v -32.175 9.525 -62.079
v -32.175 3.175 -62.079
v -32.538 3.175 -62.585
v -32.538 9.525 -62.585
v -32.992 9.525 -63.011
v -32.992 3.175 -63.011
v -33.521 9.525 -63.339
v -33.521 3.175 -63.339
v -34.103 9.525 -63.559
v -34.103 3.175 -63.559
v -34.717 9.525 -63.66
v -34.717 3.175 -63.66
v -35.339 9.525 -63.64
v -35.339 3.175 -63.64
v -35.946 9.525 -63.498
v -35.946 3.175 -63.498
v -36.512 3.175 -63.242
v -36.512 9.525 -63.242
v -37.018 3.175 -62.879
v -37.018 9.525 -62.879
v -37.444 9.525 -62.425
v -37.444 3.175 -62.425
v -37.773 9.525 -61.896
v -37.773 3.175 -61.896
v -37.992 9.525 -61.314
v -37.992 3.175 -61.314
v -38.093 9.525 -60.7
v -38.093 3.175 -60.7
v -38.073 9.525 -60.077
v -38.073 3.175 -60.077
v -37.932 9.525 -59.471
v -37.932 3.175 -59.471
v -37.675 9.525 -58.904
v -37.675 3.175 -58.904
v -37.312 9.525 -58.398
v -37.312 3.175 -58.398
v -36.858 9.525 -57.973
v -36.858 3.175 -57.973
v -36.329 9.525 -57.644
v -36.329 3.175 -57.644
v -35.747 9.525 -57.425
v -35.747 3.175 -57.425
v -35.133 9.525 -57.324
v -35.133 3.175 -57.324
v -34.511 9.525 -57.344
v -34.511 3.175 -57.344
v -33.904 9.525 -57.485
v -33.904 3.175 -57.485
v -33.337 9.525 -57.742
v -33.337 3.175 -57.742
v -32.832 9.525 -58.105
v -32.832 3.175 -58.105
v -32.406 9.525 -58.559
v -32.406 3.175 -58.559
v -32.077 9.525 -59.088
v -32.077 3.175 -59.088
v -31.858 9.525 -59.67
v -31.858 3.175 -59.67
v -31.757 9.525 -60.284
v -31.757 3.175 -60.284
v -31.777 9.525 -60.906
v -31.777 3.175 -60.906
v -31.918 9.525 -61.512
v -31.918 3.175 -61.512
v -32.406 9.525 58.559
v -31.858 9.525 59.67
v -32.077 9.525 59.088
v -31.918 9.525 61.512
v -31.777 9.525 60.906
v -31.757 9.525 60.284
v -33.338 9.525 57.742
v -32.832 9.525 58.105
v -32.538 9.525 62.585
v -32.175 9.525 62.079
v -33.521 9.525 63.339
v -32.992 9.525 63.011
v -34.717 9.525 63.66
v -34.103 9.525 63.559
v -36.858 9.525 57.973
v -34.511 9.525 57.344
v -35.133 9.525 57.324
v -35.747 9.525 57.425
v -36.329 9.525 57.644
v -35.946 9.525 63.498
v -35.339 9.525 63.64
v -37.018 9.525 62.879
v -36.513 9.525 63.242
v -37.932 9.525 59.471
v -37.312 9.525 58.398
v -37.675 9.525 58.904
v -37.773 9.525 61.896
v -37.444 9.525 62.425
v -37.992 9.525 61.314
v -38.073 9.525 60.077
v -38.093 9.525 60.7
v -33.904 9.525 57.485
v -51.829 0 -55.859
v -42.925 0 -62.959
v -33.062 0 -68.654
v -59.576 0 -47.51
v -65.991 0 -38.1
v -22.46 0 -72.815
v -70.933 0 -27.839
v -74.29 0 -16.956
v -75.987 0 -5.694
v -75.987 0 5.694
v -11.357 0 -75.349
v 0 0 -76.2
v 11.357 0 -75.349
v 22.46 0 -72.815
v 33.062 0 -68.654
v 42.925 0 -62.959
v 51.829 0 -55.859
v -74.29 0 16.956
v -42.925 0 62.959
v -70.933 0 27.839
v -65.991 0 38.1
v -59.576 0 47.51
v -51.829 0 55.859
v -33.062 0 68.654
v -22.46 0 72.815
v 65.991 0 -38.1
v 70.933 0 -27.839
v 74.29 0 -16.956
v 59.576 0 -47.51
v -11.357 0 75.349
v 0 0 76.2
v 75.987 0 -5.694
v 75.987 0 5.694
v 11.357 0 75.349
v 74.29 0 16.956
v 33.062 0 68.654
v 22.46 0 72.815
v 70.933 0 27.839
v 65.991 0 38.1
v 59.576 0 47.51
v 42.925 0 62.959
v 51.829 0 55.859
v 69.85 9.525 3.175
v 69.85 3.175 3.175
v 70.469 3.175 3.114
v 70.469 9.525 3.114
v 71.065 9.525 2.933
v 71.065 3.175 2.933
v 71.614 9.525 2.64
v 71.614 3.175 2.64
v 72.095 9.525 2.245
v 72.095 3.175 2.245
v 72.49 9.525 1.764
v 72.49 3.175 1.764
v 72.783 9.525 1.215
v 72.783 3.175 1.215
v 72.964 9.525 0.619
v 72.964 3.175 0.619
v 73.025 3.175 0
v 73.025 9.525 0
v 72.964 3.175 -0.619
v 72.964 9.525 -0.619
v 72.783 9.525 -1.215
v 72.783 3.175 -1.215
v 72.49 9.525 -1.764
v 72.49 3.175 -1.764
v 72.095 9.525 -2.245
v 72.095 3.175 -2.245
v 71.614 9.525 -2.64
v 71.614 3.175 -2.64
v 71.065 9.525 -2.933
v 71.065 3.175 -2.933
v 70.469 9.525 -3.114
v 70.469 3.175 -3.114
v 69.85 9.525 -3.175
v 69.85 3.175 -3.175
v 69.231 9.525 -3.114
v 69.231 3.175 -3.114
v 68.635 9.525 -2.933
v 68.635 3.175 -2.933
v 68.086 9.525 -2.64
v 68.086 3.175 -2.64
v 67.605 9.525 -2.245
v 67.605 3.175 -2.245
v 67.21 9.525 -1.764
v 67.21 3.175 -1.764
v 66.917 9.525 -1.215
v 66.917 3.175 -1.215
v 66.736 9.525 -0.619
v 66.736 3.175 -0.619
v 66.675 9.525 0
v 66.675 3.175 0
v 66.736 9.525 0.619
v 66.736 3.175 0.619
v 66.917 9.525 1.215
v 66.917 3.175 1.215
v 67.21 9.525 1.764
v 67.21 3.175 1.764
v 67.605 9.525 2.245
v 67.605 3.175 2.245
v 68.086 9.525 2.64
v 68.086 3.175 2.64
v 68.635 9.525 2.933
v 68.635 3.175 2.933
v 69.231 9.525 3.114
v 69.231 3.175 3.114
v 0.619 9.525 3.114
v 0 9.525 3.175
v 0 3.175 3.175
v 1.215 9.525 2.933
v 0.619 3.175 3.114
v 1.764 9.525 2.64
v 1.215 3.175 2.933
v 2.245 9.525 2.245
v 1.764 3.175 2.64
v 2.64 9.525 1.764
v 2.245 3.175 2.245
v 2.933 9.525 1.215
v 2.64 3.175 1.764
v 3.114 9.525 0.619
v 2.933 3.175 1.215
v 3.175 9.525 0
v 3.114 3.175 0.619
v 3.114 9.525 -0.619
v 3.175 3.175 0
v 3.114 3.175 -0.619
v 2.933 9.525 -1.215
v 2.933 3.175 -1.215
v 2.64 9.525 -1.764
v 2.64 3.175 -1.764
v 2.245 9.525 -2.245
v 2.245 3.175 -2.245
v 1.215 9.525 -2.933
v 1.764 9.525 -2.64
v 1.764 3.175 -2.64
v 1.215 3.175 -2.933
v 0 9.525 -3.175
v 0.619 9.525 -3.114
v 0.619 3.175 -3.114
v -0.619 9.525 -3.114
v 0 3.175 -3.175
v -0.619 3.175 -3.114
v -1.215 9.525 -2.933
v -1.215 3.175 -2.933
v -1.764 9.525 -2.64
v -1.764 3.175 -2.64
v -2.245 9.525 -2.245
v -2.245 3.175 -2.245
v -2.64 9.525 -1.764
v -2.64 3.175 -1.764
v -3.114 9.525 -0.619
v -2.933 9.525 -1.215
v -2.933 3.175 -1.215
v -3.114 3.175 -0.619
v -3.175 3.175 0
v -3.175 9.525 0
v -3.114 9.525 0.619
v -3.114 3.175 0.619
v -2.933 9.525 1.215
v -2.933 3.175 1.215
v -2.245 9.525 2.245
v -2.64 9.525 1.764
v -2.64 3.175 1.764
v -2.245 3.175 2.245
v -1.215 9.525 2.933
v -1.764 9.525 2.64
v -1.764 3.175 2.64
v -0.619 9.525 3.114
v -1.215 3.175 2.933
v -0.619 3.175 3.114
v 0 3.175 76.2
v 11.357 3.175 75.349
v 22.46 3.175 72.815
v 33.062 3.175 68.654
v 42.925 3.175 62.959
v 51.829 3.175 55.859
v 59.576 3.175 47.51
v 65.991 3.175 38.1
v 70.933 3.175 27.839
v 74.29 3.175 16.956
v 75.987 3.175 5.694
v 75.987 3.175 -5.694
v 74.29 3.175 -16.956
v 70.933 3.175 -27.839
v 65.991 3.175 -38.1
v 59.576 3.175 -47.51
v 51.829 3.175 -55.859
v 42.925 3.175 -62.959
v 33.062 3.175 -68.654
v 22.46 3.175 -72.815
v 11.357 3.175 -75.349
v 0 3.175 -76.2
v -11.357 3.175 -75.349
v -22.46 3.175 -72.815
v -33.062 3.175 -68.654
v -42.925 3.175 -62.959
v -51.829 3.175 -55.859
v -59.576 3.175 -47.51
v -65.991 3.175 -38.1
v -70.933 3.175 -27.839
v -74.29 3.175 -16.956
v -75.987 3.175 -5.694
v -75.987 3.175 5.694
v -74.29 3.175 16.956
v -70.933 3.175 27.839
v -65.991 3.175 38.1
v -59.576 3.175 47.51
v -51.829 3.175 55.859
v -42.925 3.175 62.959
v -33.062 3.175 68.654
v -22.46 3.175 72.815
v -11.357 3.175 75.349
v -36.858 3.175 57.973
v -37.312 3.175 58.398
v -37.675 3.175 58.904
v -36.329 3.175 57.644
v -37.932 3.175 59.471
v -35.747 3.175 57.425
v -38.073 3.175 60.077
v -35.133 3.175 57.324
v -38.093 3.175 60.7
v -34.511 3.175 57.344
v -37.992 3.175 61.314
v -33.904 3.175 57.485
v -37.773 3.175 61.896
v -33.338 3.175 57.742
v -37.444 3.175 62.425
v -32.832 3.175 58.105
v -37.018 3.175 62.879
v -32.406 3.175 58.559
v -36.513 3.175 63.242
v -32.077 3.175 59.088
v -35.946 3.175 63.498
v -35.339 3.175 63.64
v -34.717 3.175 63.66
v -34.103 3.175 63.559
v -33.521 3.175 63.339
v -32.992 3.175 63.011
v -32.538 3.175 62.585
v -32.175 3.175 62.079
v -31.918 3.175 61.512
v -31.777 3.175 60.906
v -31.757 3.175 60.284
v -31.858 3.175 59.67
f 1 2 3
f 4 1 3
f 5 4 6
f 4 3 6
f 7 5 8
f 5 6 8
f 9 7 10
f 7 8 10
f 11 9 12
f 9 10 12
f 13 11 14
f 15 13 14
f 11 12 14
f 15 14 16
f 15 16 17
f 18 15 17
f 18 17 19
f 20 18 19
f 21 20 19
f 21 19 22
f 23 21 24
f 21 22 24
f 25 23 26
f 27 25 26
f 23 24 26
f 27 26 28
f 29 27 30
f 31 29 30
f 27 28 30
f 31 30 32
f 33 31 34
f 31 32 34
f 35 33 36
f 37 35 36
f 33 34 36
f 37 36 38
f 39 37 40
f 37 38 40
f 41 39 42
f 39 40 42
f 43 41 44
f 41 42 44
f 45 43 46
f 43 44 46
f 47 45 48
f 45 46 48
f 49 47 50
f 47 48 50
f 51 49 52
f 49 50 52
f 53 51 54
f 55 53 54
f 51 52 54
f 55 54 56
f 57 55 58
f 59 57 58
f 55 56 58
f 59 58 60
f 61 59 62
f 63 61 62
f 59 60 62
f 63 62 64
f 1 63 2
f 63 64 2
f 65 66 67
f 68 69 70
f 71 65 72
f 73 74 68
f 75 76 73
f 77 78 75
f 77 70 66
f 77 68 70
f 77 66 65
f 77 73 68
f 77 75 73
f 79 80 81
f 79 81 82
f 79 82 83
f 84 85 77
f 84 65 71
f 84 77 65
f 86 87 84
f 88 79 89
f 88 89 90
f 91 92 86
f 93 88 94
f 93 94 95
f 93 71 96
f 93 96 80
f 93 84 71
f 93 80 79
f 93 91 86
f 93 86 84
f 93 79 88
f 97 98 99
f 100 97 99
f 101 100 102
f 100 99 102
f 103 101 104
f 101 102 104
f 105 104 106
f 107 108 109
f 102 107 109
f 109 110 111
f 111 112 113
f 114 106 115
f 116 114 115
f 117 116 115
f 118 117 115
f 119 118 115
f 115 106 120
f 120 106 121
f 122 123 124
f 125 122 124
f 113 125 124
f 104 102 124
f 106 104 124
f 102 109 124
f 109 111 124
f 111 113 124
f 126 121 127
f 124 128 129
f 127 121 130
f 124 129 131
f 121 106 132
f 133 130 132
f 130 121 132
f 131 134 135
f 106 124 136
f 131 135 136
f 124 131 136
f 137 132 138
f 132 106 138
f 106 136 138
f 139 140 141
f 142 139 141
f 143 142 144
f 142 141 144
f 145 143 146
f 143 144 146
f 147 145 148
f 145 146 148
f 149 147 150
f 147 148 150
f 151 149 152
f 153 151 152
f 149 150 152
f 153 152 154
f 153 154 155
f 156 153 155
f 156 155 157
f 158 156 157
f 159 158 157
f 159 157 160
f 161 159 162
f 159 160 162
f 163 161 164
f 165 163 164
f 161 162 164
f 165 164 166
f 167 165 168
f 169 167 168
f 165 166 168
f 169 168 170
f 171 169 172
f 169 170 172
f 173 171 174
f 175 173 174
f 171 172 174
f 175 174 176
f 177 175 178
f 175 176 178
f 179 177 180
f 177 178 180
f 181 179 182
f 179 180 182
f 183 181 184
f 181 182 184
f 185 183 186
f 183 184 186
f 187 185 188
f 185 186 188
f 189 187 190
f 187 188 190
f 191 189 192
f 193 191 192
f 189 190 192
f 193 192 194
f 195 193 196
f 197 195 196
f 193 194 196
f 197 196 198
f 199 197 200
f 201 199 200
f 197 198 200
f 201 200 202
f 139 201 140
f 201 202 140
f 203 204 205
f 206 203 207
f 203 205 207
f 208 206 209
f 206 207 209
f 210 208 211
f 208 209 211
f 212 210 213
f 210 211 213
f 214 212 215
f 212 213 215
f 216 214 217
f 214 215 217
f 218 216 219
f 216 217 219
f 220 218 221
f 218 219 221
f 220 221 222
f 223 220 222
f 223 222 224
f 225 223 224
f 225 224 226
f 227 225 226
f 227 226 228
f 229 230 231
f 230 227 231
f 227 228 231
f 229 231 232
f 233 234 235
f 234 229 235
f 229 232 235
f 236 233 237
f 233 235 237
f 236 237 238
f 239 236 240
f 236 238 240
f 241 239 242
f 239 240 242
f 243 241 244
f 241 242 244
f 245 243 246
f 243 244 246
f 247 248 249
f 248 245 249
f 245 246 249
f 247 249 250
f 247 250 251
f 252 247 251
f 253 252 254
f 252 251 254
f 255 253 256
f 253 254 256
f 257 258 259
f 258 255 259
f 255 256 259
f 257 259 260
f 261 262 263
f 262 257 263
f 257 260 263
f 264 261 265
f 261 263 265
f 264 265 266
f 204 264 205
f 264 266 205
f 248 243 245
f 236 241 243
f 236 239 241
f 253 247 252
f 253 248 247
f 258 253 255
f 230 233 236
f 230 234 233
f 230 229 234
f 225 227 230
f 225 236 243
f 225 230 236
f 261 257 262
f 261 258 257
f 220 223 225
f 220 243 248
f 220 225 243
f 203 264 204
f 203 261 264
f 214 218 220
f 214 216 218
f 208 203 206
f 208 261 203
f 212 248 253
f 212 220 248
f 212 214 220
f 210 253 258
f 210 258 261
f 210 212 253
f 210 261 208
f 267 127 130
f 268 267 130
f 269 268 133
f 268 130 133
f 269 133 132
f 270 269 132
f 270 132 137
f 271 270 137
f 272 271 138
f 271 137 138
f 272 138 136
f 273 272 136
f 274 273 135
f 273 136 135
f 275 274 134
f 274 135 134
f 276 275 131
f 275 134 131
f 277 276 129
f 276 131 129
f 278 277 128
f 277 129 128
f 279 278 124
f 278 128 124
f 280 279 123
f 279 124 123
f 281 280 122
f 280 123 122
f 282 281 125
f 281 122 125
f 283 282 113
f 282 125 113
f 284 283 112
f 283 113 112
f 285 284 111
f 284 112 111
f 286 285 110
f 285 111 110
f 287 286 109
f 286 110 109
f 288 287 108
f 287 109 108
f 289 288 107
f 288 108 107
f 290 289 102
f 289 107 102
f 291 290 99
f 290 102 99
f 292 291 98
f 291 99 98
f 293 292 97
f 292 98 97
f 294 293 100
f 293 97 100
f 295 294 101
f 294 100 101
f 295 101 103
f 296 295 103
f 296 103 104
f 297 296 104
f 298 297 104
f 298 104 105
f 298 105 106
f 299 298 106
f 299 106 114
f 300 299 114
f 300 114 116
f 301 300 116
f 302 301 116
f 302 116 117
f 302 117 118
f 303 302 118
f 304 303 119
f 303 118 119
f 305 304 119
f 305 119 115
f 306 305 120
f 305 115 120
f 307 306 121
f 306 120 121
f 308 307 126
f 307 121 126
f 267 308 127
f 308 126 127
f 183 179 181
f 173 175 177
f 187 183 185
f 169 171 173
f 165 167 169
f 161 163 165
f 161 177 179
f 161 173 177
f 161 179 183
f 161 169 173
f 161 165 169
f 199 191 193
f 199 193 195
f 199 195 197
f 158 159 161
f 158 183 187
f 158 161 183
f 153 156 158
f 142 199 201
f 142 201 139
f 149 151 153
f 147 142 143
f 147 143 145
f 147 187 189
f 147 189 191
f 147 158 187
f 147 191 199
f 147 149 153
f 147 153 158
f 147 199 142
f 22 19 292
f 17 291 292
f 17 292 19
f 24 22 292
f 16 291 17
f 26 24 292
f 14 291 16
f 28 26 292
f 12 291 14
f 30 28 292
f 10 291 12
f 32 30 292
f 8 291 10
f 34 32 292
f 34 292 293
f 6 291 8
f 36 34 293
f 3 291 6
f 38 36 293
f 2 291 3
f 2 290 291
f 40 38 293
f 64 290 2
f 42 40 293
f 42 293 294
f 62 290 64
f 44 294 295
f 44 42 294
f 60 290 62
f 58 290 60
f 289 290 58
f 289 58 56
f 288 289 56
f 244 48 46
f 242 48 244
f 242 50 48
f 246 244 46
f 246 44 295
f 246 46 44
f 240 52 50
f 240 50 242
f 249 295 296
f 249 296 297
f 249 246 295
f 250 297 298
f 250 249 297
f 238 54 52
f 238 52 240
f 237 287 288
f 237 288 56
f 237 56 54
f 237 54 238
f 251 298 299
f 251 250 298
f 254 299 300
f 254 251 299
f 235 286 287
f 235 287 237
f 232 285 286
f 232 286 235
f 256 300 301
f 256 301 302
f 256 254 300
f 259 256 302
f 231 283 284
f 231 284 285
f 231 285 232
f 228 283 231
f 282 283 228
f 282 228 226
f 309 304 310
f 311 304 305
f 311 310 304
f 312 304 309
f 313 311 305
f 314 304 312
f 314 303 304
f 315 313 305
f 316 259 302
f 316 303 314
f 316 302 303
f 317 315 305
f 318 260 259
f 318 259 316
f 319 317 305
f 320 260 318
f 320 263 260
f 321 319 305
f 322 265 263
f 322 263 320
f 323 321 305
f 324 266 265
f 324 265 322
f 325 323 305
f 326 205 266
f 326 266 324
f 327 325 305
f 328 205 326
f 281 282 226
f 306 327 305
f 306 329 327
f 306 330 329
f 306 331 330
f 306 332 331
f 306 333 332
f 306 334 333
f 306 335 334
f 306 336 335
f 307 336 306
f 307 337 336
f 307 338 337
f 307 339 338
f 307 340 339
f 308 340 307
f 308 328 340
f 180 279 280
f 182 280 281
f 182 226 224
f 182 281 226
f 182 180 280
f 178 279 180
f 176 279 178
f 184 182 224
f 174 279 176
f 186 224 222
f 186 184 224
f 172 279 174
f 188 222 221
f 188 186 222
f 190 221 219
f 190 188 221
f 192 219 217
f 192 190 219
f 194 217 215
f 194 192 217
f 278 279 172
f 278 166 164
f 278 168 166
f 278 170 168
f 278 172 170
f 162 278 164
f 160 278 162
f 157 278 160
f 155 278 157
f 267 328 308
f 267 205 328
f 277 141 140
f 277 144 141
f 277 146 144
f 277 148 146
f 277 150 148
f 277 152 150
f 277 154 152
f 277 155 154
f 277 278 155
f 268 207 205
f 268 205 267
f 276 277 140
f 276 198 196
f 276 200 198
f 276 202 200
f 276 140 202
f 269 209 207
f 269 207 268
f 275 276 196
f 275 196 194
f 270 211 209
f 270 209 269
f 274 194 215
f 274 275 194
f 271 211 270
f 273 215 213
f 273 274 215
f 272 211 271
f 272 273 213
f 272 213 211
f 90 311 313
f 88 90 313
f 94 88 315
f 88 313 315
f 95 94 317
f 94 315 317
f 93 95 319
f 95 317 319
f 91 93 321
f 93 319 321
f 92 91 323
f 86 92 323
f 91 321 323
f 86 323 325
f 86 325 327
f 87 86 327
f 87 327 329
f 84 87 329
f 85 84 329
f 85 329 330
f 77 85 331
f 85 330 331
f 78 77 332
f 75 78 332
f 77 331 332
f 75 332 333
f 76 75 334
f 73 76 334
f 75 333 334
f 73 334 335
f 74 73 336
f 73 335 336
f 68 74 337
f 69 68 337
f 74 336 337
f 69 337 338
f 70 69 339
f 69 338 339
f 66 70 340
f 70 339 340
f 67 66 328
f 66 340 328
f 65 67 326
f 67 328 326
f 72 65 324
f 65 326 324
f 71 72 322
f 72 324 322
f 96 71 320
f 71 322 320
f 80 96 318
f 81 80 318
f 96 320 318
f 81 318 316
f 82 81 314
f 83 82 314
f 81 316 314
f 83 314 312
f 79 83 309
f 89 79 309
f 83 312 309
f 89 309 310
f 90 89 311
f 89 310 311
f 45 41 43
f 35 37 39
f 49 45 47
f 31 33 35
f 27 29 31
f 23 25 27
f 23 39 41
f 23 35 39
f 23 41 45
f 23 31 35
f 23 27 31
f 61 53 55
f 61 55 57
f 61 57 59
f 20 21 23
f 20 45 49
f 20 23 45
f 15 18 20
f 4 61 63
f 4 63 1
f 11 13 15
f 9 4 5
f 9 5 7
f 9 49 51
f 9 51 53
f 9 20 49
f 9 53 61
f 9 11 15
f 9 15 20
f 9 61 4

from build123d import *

# Parameters (mm, degrees)
SKETCH1_R           = 76.2
BOSS_EXTRUDE1_DEPTH = 3.175
SKETCH3_R           = 3.175
BOSS_EXTRUDE2_DEPTH = 6.35
CIRPATTERN1_COUNT   = 3


with BuildPart() as part:
    # Sketch1 → Boss-Extrude1 (new body)
    with BuildSketch(Plane(origin=(0, 0, 0), x_dir=(1, 0, 0), z_dir=(0, 1, 0))):
        with Locations(Location((0, 0, 0), (0, 0, 270))):
            Circle(SKETCH1_R)
    extrude(amount=BOSS_EXTRUDE1_DEPTH)

    # Sketch3 → Boss-Extrude2 (add)
    with BuildSketch(Plane(origin=(0, 3.175, 0), x_dir=(1, 0, 0), z_dir=(0, 1, 0))):
        with Locations(Location((0, 0, 0), (0, 0, 270))):
            Circle(SKETCH3_R)
        with Locations(Location((69.85, 0, 0), (0, 0, 270))):
            Circle(SKETCH3_R)
    boss_extrude2 = extrude(amount=BOSS_EXTRUDE2_DEPTH)

    # CirPattern1: Boss-Extrude2 ×3 about axis
    cirpattern1_axis = Axis((0, 0, 0), (0, 1, 0))
    for i in range(1, CIRPATTERN1_COUNT):
        add(boss_extrude2.rotate(cirpattern1_axis, i * 360 / CIRPATTERN1_COUNT))


solid = part.part
